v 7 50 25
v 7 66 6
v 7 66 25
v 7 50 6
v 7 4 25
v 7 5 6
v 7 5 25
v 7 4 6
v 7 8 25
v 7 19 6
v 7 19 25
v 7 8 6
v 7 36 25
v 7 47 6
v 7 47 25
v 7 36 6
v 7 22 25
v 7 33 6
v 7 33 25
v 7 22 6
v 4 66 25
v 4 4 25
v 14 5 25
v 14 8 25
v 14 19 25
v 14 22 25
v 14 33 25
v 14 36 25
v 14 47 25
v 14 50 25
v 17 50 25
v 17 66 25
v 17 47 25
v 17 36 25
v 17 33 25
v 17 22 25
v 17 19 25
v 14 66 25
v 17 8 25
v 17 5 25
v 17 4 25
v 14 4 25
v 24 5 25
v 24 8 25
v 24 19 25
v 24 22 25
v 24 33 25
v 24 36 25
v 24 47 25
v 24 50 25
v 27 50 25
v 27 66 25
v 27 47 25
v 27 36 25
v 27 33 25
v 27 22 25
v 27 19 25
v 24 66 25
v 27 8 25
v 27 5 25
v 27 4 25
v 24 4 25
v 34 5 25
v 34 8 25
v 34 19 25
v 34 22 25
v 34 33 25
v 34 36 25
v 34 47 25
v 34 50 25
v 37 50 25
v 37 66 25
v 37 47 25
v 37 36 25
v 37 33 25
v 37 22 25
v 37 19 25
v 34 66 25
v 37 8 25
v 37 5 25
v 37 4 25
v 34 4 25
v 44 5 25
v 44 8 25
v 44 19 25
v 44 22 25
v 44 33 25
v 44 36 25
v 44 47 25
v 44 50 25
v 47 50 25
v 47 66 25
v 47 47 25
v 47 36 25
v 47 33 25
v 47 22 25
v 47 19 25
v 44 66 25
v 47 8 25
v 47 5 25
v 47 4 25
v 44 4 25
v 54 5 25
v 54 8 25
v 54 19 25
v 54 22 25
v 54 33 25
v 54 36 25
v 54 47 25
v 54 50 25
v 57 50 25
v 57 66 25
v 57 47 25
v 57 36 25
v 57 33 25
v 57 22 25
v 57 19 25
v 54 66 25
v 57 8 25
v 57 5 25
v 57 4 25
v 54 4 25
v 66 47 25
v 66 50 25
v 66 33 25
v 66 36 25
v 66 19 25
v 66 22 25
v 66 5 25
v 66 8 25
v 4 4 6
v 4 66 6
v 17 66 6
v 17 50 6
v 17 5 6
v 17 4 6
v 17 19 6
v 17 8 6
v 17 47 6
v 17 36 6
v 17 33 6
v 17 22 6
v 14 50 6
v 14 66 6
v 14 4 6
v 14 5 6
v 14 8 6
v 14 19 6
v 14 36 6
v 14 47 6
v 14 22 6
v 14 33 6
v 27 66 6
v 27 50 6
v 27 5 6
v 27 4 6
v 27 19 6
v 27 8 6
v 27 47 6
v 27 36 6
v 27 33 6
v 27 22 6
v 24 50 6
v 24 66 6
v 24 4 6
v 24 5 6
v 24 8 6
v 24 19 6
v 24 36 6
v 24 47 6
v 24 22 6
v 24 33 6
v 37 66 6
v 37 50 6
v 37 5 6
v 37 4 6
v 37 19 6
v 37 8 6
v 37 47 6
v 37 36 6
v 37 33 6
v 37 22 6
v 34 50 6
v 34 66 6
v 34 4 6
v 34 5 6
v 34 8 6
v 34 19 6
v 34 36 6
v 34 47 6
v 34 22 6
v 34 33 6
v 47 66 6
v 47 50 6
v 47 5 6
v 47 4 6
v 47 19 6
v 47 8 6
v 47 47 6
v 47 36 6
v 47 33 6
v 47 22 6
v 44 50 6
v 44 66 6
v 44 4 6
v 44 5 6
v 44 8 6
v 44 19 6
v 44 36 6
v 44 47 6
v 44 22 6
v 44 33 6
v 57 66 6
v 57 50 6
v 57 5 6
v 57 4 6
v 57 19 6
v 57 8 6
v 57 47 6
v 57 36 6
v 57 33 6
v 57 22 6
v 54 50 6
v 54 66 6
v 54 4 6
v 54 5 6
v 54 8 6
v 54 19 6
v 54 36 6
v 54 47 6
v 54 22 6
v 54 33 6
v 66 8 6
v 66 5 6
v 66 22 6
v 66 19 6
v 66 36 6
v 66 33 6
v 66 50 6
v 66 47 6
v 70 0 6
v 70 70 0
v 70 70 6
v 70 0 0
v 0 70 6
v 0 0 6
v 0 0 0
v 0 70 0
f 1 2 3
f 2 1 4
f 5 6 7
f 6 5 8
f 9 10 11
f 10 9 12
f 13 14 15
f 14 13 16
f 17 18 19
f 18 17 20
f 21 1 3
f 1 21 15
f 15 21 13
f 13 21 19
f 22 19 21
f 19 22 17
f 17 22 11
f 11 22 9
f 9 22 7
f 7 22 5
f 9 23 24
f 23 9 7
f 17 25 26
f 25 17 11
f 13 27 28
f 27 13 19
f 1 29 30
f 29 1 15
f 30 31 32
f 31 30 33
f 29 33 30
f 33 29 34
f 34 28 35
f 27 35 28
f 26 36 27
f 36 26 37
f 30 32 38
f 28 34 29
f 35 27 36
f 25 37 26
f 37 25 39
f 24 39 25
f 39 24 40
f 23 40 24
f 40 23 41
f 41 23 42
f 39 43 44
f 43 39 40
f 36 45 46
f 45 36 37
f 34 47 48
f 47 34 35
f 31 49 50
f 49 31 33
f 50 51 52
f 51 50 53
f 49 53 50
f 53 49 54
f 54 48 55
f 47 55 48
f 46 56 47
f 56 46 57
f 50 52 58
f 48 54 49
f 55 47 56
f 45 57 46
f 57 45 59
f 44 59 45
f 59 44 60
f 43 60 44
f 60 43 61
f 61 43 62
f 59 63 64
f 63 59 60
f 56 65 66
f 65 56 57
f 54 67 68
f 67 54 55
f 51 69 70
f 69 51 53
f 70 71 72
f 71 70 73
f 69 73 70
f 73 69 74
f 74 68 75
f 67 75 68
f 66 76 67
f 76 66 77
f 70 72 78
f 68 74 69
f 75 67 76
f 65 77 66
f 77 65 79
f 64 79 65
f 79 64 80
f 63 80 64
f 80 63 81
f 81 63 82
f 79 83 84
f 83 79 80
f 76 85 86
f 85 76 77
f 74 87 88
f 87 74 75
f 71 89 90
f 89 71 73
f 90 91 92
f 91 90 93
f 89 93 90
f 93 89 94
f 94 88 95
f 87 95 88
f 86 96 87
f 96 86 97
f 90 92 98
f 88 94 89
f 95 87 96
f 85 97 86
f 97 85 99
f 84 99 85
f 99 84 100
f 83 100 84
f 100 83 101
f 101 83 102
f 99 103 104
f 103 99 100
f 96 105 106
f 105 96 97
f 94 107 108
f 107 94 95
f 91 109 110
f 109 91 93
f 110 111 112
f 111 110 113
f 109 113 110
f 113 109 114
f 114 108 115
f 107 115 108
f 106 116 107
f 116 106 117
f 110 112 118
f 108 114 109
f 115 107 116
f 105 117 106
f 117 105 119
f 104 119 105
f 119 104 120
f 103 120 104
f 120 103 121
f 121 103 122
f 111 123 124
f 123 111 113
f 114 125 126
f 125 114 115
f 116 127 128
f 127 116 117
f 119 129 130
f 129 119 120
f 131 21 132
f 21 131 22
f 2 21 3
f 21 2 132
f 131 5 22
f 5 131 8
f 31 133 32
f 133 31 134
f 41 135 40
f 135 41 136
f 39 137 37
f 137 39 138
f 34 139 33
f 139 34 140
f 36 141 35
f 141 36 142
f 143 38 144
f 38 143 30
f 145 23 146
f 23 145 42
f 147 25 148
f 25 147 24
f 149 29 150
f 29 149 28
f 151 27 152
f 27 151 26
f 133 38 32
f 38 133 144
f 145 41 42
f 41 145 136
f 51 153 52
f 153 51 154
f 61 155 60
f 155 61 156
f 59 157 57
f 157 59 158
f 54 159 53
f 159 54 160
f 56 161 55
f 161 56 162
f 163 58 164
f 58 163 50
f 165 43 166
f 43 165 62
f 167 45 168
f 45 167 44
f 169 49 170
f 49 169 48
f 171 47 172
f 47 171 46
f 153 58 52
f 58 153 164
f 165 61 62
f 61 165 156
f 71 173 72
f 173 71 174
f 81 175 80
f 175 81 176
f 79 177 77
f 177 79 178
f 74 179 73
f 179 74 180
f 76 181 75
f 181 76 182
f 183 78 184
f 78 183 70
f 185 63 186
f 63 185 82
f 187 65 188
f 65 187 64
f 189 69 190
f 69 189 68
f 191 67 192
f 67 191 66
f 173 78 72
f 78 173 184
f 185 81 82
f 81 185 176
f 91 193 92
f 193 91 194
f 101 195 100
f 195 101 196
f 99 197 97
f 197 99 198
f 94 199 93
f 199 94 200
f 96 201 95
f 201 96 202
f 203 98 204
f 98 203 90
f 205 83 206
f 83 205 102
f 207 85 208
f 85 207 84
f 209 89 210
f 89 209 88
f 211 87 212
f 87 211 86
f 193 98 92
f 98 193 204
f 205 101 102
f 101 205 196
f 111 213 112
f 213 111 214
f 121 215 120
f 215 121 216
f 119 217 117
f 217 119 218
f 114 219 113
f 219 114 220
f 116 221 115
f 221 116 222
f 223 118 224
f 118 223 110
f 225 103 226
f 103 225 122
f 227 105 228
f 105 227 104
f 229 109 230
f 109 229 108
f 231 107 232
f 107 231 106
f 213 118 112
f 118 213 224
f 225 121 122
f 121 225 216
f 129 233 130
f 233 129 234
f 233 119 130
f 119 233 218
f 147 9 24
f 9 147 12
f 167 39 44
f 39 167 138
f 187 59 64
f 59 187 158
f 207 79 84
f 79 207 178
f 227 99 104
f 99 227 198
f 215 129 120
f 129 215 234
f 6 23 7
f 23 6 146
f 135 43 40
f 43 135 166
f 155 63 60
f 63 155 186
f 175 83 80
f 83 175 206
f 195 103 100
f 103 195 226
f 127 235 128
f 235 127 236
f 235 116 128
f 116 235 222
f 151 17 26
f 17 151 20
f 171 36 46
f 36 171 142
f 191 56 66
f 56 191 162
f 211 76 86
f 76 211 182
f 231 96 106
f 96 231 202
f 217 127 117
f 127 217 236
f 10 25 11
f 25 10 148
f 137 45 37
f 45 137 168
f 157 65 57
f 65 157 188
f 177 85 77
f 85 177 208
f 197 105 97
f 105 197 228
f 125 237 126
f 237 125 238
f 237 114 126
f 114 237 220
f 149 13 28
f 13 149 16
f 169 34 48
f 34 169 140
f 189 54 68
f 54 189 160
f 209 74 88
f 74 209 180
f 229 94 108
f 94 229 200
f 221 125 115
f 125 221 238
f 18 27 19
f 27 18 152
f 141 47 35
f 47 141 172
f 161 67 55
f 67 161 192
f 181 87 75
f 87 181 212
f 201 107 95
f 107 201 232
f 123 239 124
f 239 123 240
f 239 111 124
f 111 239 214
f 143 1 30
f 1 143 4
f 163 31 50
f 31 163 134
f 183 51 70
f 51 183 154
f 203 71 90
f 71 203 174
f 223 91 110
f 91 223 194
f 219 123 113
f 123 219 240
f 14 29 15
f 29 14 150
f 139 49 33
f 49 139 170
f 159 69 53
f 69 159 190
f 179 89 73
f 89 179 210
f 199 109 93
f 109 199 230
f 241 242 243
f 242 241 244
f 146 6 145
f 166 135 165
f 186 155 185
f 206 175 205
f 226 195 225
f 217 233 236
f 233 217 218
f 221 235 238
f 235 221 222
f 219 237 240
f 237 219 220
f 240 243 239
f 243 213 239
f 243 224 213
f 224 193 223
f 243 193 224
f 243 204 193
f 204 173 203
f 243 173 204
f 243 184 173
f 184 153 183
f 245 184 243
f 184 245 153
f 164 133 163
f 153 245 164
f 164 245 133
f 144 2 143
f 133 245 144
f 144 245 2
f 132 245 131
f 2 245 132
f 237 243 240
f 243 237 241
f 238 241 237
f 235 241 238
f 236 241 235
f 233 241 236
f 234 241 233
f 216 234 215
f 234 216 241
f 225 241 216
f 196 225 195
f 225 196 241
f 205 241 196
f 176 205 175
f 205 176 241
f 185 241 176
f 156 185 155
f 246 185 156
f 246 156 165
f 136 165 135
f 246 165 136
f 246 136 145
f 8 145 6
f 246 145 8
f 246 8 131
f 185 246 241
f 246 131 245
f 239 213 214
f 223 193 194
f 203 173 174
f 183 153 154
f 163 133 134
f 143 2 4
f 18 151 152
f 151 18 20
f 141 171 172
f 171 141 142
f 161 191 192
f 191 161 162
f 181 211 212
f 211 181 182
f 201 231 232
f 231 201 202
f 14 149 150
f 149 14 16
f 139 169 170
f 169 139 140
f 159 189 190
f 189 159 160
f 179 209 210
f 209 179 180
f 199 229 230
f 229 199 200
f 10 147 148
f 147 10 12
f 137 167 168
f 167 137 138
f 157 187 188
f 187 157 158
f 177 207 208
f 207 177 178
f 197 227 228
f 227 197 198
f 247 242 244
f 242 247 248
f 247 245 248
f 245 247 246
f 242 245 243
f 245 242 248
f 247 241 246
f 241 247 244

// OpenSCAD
$fn = 32;

// ----------------------------------------------------------------------
// Heatsink: cross fin block
// ----------------------------------------------------------------------

// --- parameters (mm) ---
base_l = 70;              // base length, X
base_w = 70;              // base width, Y
base_t = 6;               // base plate thickness
fin_h = 20;               // fin height above the base
fin_t = 3;                // fin thickness
edge = 4;                 // margin from the base ends
pitch = 10;               // fin pitch
rib_pitch = 14;           // cross rib pitch
fit_tol = 0.05;           // tolerance for press fits, mm
free_tol = 0.2;           // tolerance for clearance fits, mm

n_fins = floor((base_l - 2 * edge - fin_t) / pitch) + 1;  // fin count
total_h = base_t + fin_h - 1;  // overall height
n_ribs = floor((base_w - 2 * edge) / rib_pitch);  // rib count

union() {
  cube([base_l, base_w, base_t]);
  for (i = [0 : n_fins - 1])
    translate([edge + i * pitch, edge, base_t - 1])
      cube([fin_t, base_w - 2 * edge, fin_h]);
  for (i = [0 : n_ribs - 1])
    translate([edge, edge + 1 + i * rib_pitch, base_t - 1])
      cube([base_l - 2 * edge, fin_t, fin_h]);
}
